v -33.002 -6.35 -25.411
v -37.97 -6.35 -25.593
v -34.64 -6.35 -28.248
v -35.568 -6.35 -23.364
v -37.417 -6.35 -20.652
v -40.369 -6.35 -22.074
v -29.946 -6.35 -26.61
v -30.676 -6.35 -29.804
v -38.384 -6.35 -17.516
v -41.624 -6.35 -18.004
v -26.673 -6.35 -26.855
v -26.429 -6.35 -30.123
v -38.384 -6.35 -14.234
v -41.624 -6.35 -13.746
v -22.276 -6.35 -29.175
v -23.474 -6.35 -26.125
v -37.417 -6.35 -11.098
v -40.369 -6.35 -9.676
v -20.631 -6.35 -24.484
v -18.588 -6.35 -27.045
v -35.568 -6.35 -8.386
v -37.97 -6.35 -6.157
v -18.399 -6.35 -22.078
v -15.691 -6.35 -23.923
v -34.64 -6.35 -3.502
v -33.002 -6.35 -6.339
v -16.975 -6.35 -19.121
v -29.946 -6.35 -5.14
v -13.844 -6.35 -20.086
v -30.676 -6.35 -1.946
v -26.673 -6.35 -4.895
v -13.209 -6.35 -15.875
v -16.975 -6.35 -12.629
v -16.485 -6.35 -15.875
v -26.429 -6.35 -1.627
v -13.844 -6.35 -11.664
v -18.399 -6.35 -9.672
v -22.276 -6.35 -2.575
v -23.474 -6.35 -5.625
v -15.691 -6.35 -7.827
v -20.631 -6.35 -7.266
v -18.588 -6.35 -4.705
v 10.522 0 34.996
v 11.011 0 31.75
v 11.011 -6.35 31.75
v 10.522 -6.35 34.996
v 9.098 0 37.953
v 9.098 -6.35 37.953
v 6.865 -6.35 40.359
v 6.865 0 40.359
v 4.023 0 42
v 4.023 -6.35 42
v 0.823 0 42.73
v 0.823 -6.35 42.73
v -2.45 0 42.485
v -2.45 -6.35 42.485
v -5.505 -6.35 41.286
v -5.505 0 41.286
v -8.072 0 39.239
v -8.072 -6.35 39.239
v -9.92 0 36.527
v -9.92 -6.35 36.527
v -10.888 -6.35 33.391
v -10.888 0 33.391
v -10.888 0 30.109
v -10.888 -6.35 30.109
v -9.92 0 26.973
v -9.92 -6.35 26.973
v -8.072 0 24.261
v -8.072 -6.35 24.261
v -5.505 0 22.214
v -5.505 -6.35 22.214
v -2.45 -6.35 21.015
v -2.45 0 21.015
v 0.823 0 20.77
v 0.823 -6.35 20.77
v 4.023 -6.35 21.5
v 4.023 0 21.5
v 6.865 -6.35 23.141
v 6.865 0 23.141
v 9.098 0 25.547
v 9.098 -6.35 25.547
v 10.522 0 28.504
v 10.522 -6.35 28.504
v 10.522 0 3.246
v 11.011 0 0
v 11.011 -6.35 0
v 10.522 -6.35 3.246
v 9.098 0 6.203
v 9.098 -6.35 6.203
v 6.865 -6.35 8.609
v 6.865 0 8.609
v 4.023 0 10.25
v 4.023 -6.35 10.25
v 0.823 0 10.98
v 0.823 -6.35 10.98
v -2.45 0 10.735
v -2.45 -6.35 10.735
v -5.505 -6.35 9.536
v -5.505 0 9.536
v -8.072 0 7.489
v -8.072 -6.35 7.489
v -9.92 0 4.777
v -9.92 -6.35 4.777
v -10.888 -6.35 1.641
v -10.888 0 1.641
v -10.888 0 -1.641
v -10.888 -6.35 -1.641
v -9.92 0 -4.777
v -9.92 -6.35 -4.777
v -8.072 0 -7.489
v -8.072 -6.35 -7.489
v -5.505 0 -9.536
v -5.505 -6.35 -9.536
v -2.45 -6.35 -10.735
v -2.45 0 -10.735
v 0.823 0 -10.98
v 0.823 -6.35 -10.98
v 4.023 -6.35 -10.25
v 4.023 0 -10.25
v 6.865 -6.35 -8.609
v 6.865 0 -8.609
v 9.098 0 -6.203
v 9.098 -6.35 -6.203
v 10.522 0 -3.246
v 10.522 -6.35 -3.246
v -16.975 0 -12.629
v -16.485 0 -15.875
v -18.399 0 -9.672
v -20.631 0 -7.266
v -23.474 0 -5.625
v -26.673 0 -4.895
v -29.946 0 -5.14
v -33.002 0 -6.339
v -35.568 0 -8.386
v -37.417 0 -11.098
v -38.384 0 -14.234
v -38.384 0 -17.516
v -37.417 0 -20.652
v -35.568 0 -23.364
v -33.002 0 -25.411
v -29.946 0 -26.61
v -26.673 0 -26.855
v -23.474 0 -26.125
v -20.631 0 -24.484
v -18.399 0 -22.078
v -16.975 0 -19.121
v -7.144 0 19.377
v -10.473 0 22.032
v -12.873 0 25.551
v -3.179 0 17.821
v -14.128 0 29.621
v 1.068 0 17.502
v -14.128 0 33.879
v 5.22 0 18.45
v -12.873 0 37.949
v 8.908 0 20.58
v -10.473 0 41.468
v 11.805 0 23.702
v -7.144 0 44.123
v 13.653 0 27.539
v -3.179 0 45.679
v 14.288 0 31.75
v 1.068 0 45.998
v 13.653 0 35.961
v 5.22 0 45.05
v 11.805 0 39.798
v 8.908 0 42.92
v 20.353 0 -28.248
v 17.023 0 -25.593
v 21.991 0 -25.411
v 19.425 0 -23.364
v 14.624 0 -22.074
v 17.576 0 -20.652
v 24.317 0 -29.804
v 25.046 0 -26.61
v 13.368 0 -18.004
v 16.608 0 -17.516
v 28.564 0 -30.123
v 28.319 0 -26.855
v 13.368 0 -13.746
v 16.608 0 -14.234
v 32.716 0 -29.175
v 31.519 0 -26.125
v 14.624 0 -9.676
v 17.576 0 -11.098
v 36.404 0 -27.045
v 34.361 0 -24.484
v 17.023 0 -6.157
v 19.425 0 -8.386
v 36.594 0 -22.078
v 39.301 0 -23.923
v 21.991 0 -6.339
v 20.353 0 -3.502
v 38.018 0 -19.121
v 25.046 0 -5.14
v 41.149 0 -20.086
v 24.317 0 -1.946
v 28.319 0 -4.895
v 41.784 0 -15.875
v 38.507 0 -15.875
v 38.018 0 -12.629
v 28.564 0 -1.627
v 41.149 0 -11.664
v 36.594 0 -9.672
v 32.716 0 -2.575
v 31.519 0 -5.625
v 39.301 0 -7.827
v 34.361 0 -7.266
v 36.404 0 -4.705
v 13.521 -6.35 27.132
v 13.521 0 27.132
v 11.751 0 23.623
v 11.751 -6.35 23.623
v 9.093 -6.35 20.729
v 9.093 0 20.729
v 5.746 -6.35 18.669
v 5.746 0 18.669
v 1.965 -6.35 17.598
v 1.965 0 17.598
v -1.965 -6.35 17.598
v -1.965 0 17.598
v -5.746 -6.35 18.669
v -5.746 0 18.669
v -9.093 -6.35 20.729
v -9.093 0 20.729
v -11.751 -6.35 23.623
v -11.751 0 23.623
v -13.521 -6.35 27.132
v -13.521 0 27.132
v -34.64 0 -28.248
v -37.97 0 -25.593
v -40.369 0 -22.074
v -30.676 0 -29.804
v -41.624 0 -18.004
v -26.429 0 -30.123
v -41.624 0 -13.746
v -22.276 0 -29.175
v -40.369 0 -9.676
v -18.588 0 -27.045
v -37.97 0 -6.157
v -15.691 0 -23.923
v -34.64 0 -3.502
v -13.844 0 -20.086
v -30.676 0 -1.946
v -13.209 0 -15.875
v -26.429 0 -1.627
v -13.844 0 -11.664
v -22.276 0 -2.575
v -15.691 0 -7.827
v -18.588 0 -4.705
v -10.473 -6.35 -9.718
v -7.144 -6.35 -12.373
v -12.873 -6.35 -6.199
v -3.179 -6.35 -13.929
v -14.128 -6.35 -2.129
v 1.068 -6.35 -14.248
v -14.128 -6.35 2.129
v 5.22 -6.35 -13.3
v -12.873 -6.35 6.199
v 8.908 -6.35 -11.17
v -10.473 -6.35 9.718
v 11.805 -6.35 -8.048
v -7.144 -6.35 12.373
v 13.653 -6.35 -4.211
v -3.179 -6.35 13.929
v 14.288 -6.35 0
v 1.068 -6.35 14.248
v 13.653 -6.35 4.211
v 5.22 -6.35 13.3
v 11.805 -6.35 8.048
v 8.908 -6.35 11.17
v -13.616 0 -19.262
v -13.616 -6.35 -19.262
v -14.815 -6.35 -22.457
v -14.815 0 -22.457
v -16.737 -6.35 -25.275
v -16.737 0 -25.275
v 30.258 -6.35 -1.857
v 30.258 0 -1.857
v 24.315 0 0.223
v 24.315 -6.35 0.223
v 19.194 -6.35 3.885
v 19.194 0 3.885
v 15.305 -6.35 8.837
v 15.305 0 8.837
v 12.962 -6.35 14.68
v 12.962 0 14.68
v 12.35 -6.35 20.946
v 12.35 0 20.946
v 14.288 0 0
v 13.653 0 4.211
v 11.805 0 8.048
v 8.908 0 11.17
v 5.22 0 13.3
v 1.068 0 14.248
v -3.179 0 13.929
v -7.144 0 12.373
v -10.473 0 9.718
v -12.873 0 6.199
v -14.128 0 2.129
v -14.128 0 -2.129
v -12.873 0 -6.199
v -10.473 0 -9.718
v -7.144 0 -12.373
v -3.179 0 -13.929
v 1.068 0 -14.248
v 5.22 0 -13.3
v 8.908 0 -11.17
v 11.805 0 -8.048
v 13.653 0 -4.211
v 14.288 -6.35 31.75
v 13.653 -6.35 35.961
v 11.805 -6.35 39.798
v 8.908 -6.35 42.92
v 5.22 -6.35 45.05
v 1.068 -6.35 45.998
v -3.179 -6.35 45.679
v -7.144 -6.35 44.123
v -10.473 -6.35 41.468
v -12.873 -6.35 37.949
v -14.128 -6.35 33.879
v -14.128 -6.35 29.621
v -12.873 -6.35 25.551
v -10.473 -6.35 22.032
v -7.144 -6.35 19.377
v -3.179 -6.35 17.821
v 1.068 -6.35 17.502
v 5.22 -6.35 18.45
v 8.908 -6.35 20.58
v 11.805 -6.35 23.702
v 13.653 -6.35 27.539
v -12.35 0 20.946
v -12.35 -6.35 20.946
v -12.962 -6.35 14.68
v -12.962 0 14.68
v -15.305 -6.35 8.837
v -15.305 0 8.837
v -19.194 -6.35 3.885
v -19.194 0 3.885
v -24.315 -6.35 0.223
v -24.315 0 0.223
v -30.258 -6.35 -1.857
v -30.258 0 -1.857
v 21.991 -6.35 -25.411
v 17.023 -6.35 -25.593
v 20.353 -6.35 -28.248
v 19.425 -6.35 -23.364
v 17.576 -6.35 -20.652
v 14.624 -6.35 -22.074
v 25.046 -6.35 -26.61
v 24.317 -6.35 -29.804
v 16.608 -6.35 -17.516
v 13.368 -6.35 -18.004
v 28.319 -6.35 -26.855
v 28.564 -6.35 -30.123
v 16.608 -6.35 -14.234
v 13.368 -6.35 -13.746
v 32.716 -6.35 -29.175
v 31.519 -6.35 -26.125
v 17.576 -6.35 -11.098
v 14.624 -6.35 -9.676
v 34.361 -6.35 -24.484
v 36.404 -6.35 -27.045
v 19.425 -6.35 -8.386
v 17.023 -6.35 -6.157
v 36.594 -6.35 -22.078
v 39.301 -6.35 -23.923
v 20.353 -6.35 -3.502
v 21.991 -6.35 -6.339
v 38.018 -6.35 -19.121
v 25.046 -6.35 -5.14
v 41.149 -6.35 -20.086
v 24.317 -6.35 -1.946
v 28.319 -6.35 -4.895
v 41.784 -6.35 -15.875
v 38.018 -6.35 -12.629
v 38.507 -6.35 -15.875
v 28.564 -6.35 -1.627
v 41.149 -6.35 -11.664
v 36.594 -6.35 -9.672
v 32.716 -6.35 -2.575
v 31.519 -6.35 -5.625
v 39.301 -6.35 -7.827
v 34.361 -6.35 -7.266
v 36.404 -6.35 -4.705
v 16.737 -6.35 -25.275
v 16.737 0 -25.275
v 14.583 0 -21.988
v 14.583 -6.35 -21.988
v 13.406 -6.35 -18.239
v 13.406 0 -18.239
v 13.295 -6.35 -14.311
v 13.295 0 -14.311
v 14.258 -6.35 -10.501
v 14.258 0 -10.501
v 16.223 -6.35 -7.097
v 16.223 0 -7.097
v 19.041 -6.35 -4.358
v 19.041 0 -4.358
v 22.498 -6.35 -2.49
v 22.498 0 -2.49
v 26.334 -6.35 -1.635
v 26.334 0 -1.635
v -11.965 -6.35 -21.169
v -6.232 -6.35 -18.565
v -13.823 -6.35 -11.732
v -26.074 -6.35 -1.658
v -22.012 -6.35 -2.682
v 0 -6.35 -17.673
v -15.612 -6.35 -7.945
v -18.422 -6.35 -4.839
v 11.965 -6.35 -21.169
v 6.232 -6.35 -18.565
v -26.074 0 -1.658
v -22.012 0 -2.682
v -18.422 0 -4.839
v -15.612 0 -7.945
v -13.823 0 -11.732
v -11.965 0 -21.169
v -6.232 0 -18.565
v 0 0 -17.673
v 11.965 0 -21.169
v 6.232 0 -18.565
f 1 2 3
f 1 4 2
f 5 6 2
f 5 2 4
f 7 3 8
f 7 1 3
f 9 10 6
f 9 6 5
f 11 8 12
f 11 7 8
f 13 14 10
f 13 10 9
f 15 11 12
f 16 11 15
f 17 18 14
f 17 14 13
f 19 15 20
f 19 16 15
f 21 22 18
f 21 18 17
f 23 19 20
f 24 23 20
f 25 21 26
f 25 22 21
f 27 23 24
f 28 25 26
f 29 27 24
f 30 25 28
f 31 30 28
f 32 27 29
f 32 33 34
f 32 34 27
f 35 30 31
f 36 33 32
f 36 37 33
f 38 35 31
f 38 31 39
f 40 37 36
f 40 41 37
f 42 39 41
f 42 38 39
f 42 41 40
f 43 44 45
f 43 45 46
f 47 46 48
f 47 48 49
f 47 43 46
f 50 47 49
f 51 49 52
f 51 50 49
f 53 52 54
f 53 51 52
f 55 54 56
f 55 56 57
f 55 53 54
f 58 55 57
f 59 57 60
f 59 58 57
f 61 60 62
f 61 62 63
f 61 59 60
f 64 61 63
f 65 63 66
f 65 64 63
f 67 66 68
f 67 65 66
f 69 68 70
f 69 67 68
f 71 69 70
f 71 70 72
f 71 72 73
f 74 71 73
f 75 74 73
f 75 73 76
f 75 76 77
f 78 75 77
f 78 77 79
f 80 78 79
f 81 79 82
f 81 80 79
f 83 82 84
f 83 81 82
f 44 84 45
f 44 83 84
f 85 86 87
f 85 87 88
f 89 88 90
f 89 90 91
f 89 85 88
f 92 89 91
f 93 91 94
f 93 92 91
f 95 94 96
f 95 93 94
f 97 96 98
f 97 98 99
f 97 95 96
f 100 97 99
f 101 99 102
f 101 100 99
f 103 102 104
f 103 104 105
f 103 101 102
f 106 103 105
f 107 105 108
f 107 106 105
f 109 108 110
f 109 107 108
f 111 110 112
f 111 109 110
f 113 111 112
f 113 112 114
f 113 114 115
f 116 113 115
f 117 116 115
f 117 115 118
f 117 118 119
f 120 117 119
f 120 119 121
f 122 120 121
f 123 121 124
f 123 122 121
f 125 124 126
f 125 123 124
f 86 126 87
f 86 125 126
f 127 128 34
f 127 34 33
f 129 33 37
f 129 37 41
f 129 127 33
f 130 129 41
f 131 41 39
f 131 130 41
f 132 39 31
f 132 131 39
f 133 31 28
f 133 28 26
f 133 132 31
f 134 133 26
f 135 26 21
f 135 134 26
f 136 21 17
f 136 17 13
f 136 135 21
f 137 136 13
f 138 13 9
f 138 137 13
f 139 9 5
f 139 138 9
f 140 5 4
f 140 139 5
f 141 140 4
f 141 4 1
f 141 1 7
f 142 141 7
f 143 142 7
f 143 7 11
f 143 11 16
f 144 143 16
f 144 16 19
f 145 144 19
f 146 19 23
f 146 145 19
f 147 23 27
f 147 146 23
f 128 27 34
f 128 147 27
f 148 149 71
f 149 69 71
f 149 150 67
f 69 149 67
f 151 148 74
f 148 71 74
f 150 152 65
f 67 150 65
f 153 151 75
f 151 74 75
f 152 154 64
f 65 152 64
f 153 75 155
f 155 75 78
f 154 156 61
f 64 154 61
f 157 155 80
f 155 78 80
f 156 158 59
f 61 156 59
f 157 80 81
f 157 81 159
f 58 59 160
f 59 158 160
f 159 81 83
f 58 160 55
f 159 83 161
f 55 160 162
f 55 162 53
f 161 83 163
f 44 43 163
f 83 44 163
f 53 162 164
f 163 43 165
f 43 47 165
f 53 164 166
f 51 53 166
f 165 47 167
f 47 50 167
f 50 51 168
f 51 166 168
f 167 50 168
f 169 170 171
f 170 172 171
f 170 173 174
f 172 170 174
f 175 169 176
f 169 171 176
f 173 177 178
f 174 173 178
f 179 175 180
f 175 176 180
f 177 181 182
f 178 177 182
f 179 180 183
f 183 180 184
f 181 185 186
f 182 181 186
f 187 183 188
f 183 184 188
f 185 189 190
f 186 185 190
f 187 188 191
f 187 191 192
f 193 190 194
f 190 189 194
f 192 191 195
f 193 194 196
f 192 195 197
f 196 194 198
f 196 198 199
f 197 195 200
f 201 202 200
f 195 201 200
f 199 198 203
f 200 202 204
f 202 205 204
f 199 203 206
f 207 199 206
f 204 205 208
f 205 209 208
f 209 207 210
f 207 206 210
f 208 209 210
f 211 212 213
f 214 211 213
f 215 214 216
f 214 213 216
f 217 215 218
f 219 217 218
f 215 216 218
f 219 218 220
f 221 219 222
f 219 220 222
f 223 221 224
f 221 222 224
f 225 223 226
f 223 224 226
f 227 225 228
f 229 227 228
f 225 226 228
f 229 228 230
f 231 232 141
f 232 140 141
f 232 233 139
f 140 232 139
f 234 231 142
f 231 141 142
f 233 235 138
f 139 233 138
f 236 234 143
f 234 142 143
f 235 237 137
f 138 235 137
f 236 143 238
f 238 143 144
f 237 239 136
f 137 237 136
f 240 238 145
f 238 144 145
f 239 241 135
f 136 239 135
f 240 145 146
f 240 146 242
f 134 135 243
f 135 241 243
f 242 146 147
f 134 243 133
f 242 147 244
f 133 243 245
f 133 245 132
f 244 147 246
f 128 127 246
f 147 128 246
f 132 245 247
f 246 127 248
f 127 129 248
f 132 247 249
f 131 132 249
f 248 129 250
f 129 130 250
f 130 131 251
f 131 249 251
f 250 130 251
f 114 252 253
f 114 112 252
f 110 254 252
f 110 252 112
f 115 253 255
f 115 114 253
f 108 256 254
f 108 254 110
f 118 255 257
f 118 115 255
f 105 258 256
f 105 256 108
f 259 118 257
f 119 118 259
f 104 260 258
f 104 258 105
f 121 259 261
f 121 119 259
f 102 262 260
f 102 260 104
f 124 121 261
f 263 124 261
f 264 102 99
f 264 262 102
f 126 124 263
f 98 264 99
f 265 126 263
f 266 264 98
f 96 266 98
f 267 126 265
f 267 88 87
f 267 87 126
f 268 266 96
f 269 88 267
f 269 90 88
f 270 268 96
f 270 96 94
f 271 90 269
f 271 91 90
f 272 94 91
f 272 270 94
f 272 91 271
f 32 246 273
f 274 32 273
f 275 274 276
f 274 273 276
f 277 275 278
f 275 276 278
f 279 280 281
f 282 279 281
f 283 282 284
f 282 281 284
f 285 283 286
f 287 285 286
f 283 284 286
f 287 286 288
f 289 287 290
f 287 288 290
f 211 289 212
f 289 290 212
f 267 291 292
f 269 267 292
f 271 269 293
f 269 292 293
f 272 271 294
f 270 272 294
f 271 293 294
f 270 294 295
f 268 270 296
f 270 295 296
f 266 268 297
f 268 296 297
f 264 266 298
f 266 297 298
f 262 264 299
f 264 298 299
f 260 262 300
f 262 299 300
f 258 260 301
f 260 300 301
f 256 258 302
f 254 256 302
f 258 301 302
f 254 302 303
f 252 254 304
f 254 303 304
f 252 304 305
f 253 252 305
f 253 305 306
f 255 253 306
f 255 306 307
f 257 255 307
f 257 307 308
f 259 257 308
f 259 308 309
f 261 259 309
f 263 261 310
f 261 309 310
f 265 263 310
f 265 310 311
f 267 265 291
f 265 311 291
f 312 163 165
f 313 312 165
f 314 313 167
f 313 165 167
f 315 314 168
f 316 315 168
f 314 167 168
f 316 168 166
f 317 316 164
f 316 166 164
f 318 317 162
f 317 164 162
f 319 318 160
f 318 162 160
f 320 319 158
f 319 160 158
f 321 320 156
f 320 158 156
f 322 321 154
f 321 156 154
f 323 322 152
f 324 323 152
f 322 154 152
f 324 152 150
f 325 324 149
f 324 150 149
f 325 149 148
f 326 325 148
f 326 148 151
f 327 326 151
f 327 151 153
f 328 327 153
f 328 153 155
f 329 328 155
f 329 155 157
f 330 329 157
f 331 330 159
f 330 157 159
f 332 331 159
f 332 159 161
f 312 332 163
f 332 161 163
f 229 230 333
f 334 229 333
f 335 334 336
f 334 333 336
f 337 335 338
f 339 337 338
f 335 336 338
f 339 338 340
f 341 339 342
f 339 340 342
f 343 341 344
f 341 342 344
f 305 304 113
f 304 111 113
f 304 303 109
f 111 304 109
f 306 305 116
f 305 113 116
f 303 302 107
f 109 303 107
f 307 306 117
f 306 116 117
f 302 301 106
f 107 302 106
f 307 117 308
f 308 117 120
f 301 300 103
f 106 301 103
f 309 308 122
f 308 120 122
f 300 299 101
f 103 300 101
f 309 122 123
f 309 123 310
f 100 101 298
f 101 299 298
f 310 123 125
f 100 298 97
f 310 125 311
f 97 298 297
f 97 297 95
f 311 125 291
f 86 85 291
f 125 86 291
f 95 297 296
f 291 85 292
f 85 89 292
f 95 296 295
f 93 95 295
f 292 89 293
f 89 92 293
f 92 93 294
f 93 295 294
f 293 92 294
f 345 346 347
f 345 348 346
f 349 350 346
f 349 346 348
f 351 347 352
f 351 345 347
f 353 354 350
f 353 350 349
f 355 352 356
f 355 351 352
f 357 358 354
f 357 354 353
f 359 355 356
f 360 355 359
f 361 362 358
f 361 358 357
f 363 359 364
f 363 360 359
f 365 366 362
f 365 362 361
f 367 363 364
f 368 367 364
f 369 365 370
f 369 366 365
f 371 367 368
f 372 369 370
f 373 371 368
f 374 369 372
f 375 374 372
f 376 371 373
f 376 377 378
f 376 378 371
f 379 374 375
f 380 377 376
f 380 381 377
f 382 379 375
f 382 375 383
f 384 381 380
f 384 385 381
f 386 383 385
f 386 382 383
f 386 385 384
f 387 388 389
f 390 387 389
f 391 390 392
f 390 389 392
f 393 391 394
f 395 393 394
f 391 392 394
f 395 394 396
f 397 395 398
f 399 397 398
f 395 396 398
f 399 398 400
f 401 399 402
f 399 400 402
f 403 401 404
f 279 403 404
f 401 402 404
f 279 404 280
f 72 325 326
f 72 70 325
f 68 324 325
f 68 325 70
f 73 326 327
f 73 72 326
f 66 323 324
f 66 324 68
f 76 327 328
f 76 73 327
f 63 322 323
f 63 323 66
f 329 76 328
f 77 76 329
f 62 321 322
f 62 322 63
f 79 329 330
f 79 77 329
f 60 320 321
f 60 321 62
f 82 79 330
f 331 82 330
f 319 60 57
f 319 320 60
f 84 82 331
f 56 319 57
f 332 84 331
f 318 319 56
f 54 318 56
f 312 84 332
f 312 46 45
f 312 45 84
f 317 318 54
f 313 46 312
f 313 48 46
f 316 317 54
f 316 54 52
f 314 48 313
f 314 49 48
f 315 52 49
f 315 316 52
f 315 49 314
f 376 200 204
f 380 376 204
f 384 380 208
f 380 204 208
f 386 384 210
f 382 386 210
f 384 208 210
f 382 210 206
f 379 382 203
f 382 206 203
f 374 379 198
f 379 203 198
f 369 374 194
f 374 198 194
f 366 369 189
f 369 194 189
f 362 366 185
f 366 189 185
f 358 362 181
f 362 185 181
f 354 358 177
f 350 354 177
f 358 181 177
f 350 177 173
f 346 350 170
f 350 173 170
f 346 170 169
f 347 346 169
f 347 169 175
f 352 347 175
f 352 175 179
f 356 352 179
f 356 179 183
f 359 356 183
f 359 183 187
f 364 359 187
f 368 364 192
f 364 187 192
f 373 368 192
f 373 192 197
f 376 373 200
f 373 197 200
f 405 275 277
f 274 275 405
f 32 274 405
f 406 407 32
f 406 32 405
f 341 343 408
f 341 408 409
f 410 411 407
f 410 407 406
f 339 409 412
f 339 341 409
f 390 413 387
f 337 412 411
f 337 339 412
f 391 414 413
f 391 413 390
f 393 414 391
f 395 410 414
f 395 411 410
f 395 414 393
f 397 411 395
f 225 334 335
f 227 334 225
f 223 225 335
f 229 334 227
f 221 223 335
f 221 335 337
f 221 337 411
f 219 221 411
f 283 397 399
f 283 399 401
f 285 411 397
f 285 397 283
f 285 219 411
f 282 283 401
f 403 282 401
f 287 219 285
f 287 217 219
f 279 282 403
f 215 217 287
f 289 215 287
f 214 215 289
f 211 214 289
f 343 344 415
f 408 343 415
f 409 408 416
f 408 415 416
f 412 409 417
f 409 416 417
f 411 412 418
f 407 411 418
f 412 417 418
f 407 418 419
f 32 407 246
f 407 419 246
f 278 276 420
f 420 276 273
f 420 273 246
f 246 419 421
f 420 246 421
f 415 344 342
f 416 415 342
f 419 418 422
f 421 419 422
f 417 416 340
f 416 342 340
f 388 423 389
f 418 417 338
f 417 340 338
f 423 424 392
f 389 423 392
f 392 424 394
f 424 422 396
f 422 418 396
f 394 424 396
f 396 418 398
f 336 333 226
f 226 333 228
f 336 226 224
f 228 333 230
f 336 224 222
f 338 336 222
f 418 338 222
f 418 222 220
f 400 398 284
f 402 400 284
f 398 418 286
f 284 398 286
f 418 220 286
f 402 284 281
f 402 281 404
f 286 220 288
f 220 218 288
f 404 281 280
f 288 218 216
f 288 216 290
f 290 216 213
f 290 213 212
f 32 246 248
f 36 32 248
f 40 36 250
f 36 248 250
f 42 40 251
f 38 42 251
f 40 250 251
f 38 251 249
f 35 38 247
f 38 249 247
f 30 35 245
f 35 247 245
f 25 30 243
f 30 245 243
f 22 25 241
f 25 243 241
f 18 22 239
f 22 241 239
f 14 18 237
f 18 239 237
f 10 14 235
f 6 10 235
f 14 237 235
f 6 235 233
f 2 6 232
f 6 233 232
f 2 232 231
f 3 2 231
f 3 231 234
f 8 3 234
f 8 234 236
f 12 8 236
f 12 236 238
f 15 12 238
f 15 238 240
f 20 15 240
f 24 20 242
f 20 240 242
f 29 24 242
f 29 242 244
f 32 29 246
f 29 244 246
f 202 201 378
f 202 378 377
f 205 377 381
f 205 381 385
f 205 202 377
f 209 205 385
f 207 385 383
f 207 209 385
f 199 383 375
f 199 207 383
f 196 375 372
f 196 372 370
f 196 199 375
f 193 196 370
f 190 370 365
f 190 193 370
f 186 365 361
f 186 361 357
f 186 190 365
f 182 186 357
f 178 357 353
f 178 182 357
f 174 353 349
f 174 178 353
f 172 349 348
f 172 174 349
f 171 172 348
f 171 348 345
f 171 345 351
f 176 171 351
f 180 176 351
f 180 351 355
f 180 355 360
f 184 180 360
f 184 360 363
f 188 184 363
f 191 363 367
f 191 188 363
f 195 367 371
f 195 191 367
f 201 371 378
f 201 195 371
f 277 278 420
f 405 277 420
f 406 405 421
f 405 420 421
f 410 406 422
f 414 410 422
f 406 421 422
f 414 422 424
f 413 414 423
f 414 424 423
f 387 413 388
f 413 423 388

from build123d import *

# Parameters (mm, degrees)
F2_DEPTH = 6.35
F0_R     = 14.2875
F0_R_2   = 11.0109


with BuildPart() as f2:
    # F1 (on Front) → F2 (new body)
    with BuildSketch(Plane.XZ):
        with BuildLine():
            ThreePointArc((-13.5206938879, 27.1322632123), (-15.305469781, 8.8366170981), (-30.257576148, -1.8568672225))
            ThreePointArc((-30.257576148, -1.8568672225), (-18.4221394691, -4.8390520266), (-13.2088065702, -15.875))
            ThreePointArc((-13.2088065702, -15.875), (-14.1198733557, -20.8953277493), (-16.7368822601, -25.2753959899))
            ThreePointArc((-16.7368822601, -25.2753959899), (0, -17.6732341963), (16.7368822601, -25.2753959899))
            ThreePointArc((16.7368822601, -25.2753959899), (15.1229686136, -8.73125), (30.257576148, -1.8568672225))
            ThreePointArc((30.257576148, -1.8568672225), (15.305469781, 8.8366170981), (13.5206938879, 27.1322632123))
            ThreePointArc((13.5206938879, 27.1322632123), (0, 17.4625), (-13.5206938879, 27.1322632123))
        make_face()
    extrude(amount=F2_DEPTH)


with BuildPart() as f2b:
    # F0 (on Front) → F2, piece 2 (new body)
    with BuildSketch(Plane.XZ):
        with Locations((27.4963065702, -15.875)):
            Circle(F0_R)
        with Locations((27.4963065702, -15.875)):
            Circle(F0_R_2, mode=Mode.SUBTRACT)
    extrude(amount=F2_DEPTH)


with BuildPart() as f2c:
    # F0 (on Front) → F2, piece 3 (new body)
    with BuildSketch(Plane.XZ):
        Circle(F0_R)
        Circle(F0_R_2, mode=Mode.SUBTRACT)
    extrude(amount=F2_DEPTH)


with BuildPart() as f2d:
    # F0 (on Front) → F2, piece 4 (new body)
    with BuildSketch(Plane.XZ):
        with Locations((-27.4963065702, -15.875)):
            Circle(F0_R)
        with Locations((-27.4963065702, -15.875)):
            Circle(F0_R_2, mode=Mode.SUBTRACT)
    extrude(amount=F2_DEPTH)


with BuildPart() as f2e:
    # F0 (on Front) → F2, piece 5 (new body)
    with BuildSketch(Plane.XZ):
        with Locations((0, 31.75)):
            Circle(F0_R)
        with Locations((0, 31.75)):
            Circle(F0_R_2, mode=Mode.SUBTRACT)
    extrude(amount=F2_DEPTH)


solid = Compound([f2.part, f2b.part, f2c.part, f2d.part, f2e.part])
